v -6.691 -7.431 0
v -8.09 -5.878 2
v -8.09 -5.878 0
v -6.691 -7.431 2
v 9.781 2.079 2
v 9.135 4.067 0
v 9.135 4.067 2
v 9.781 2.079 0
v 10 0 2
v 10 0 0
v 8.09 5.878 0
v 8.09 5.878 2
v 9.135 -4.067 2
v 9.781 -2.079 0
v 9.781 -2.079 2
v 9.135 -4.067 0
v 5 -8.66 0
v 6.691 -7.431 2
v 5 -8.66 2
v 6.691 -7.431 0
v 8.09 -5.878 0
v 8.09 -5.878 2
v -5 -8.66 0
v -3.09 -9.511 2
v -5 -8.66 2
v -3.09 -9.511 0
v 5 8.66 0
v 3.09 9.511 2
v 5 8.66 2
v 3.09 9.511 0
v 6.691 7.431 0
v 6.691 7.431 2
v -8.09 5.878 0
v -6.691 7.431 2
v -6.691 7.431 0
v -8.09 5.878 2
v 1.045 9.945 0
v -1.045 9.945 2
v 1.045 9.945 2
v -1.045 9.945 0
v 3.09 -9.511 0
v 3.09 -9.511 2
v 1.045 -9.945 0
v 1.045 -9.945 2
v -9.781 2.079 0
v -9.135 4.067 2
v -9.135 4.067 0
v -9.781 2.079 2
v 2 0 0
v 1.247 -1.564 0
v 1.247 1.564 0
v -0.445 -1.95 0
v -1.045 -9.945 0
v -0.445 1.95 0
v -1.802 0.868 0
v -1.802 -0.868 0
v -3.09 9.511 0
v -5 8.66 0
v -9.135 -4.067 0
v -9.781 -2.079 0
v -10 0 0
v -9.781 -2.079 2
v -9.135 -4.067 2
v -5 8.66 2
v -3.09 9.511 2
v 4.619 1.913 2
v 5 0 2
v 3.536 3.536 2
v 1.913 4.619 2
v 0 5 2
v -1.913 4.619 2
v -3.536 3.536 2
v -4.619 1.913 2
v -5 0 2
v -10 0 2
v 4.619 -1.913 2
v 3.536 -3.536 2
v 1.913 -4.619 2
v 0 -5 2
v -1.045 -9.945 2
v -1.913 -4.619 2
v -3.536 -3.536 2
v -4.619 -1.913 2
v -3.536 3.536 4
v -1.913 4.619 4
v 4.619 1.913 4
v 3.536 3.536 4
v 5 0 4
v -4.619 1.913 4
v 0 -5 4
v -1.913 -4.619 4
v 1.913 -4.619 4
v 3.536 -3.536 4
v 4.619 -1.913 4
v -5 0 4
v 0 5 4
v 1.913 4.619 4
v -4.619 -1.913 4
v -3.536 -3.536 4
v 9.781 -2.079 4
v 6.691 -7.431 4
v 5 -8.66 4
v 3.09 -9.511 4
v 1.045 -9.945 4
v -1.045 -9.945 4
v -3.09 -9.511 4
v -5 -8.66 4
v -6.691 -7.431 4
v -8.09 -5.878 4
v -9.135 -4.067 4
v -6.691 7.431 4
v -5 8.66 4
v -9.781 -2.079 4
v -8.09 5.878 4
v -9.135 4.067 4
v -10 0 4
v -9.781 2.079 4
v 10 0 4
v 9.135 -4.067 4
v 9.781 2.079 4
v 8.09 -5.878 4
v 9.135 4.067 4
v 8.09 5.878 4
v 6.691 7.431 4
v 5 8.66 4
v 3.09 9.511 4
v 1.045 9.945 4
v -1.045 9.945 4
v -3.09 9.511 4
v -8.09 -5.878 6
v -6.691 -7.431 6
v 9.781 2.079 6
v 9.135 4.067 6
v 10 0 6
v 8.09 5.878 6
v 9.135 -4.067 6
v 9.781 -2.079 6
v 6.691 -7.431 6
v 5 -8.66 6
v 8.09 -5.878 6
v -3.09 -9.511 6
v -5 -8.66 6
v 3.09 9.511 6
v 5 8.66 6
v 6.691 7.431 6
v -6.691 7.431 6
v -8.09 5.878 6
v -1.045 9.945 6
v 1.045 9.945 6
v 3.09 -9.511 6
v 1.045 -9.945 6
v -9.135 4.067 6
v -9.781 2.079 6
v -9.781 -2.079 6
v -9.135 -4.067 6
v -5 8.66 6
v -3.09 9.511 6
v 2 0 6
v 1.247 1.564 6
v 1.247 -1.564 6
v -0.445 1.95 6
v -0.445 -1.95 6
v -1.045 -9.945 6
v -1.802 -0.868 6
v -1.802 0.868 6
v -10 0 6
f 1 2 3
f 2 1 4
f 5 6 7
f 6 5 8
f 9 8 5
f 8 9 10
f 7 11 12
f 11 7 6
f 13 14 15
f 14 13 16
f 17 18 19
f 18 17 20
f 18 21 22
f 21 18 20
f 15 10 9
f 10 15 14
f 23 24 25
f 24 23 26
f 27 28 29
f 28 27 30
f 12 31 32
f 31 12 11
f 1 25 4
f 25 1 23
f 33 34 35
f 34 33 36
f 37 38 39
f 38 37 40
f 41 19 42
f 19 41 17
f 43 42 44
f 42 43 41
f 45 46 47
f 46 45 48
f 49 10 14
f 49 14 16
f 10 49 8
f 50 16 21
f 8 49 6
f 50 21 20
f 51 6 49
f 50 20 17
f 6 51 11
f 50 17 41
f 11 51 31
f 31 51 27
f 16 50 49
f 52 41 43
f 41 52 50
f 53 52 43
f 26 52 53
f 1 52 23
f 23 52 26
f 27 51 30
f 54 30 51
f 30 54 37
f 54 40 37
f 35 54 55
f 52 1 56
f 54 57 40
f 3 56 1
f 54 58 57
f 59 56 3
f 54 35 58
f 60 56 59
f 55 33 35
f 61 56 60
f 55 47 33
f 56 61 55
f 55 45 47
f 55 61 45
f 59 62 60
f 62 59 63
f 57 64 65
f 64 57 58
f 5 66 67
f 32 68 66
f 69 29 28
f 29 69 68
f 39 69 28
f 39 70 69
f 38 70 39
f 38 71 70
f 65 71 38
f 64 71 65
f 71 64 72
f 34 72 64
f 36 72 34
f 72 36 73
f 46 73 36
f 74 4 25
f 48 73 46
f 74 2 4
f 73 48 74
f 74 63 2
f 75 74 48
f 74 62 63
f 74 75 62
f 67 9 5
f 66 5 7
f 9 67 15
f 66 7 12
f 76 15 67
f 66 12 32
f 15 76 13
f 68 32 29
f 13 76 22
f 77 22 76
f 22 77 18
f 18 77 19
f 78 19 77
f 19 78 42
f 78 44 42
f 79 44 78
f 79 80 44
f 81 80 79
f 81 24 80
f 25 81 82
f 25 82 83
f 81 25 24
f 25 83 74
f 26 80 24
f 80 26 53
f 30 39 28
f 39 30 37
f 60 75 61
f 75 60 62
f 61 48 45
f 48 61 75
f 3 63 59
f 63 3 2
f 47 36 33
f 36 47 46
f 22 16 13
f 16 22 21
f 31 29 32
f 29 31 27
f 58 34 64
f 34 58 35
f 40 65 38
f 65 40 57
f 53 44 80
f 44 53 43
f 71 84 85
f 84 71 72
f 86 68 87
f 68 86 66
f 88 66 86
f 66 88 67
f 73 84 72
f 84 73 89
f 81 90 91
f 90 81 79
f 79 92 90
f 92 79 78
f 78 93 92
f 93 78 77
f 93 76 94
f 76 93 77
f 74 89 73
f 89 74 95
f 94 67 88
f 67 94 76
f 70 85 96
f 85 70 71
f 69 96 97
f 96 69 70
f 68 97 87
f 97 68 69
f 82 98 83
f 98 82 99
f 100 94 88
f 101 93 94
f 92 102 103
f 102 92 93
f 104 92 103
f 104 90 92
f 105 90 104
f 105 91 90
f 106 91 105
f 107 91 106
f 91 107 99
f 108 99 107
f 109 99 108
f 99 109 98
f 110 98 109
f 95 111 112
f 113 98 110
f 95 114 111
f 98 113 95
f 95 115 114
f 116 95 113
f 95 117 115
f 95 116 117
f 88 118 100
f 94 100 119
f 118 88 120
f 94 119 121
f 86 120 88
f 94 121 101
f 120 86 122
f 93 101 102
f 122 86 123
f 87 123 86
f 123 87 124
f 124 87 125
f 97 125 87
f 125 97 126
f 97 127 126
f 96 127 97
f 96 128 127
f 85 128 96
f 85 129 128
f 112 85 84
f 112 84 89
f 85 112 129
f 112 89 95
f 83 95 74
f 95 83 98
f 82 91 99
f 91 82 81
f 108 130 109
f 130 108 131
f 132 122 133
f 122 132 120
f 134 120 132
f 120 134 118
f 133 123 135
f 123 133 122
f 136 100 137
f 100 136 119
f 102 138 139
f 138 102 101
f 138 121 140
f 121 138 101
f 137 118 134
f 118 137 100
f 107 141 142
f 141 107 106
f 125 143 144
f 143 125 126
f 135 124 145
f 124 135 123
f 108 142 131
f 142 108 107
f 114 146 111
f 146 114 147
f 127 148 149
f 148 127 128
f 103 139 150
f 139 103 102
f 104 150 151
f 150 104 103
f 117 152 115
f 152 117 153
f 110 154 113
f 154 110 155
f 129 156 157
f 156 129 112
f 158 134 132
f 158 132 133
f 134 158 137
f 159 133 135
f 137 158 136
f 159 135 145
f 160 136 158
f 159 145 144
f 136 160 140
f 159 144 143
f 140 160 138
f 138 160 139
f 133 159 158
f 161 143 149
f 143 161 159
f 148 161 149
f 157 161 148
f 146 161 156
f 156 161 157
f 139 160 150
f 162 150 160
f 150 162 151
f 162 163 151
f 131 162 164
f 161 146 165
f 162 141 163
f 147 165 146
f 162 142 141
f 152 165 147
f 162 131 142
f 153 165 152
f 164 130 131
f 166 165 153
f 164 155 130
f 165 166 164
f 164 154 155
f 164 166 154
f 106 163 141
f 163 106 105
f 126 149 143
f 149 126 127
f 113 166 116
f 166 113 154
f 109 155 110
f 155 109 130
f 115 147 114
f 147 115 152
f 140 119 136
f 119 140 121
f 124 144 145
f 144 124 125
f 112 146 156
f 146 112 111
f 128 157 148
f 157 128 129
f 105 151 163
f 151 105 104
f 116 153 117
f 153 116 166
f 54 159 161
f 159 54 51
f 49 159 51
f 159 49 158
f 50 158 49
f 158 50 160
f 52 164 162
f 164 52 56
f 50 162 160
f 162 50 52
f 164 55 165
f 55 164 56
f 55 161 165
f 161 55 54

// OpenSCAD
difference(){
	union(){
		cylinder(h=2,r=10);
		translate([0,0,2]){cylinder(h=2,r=5);}
		translate([0,0,4]){cylinder(h=2,r=10);}
	}
	cylinder(h=6,r=2);
}
